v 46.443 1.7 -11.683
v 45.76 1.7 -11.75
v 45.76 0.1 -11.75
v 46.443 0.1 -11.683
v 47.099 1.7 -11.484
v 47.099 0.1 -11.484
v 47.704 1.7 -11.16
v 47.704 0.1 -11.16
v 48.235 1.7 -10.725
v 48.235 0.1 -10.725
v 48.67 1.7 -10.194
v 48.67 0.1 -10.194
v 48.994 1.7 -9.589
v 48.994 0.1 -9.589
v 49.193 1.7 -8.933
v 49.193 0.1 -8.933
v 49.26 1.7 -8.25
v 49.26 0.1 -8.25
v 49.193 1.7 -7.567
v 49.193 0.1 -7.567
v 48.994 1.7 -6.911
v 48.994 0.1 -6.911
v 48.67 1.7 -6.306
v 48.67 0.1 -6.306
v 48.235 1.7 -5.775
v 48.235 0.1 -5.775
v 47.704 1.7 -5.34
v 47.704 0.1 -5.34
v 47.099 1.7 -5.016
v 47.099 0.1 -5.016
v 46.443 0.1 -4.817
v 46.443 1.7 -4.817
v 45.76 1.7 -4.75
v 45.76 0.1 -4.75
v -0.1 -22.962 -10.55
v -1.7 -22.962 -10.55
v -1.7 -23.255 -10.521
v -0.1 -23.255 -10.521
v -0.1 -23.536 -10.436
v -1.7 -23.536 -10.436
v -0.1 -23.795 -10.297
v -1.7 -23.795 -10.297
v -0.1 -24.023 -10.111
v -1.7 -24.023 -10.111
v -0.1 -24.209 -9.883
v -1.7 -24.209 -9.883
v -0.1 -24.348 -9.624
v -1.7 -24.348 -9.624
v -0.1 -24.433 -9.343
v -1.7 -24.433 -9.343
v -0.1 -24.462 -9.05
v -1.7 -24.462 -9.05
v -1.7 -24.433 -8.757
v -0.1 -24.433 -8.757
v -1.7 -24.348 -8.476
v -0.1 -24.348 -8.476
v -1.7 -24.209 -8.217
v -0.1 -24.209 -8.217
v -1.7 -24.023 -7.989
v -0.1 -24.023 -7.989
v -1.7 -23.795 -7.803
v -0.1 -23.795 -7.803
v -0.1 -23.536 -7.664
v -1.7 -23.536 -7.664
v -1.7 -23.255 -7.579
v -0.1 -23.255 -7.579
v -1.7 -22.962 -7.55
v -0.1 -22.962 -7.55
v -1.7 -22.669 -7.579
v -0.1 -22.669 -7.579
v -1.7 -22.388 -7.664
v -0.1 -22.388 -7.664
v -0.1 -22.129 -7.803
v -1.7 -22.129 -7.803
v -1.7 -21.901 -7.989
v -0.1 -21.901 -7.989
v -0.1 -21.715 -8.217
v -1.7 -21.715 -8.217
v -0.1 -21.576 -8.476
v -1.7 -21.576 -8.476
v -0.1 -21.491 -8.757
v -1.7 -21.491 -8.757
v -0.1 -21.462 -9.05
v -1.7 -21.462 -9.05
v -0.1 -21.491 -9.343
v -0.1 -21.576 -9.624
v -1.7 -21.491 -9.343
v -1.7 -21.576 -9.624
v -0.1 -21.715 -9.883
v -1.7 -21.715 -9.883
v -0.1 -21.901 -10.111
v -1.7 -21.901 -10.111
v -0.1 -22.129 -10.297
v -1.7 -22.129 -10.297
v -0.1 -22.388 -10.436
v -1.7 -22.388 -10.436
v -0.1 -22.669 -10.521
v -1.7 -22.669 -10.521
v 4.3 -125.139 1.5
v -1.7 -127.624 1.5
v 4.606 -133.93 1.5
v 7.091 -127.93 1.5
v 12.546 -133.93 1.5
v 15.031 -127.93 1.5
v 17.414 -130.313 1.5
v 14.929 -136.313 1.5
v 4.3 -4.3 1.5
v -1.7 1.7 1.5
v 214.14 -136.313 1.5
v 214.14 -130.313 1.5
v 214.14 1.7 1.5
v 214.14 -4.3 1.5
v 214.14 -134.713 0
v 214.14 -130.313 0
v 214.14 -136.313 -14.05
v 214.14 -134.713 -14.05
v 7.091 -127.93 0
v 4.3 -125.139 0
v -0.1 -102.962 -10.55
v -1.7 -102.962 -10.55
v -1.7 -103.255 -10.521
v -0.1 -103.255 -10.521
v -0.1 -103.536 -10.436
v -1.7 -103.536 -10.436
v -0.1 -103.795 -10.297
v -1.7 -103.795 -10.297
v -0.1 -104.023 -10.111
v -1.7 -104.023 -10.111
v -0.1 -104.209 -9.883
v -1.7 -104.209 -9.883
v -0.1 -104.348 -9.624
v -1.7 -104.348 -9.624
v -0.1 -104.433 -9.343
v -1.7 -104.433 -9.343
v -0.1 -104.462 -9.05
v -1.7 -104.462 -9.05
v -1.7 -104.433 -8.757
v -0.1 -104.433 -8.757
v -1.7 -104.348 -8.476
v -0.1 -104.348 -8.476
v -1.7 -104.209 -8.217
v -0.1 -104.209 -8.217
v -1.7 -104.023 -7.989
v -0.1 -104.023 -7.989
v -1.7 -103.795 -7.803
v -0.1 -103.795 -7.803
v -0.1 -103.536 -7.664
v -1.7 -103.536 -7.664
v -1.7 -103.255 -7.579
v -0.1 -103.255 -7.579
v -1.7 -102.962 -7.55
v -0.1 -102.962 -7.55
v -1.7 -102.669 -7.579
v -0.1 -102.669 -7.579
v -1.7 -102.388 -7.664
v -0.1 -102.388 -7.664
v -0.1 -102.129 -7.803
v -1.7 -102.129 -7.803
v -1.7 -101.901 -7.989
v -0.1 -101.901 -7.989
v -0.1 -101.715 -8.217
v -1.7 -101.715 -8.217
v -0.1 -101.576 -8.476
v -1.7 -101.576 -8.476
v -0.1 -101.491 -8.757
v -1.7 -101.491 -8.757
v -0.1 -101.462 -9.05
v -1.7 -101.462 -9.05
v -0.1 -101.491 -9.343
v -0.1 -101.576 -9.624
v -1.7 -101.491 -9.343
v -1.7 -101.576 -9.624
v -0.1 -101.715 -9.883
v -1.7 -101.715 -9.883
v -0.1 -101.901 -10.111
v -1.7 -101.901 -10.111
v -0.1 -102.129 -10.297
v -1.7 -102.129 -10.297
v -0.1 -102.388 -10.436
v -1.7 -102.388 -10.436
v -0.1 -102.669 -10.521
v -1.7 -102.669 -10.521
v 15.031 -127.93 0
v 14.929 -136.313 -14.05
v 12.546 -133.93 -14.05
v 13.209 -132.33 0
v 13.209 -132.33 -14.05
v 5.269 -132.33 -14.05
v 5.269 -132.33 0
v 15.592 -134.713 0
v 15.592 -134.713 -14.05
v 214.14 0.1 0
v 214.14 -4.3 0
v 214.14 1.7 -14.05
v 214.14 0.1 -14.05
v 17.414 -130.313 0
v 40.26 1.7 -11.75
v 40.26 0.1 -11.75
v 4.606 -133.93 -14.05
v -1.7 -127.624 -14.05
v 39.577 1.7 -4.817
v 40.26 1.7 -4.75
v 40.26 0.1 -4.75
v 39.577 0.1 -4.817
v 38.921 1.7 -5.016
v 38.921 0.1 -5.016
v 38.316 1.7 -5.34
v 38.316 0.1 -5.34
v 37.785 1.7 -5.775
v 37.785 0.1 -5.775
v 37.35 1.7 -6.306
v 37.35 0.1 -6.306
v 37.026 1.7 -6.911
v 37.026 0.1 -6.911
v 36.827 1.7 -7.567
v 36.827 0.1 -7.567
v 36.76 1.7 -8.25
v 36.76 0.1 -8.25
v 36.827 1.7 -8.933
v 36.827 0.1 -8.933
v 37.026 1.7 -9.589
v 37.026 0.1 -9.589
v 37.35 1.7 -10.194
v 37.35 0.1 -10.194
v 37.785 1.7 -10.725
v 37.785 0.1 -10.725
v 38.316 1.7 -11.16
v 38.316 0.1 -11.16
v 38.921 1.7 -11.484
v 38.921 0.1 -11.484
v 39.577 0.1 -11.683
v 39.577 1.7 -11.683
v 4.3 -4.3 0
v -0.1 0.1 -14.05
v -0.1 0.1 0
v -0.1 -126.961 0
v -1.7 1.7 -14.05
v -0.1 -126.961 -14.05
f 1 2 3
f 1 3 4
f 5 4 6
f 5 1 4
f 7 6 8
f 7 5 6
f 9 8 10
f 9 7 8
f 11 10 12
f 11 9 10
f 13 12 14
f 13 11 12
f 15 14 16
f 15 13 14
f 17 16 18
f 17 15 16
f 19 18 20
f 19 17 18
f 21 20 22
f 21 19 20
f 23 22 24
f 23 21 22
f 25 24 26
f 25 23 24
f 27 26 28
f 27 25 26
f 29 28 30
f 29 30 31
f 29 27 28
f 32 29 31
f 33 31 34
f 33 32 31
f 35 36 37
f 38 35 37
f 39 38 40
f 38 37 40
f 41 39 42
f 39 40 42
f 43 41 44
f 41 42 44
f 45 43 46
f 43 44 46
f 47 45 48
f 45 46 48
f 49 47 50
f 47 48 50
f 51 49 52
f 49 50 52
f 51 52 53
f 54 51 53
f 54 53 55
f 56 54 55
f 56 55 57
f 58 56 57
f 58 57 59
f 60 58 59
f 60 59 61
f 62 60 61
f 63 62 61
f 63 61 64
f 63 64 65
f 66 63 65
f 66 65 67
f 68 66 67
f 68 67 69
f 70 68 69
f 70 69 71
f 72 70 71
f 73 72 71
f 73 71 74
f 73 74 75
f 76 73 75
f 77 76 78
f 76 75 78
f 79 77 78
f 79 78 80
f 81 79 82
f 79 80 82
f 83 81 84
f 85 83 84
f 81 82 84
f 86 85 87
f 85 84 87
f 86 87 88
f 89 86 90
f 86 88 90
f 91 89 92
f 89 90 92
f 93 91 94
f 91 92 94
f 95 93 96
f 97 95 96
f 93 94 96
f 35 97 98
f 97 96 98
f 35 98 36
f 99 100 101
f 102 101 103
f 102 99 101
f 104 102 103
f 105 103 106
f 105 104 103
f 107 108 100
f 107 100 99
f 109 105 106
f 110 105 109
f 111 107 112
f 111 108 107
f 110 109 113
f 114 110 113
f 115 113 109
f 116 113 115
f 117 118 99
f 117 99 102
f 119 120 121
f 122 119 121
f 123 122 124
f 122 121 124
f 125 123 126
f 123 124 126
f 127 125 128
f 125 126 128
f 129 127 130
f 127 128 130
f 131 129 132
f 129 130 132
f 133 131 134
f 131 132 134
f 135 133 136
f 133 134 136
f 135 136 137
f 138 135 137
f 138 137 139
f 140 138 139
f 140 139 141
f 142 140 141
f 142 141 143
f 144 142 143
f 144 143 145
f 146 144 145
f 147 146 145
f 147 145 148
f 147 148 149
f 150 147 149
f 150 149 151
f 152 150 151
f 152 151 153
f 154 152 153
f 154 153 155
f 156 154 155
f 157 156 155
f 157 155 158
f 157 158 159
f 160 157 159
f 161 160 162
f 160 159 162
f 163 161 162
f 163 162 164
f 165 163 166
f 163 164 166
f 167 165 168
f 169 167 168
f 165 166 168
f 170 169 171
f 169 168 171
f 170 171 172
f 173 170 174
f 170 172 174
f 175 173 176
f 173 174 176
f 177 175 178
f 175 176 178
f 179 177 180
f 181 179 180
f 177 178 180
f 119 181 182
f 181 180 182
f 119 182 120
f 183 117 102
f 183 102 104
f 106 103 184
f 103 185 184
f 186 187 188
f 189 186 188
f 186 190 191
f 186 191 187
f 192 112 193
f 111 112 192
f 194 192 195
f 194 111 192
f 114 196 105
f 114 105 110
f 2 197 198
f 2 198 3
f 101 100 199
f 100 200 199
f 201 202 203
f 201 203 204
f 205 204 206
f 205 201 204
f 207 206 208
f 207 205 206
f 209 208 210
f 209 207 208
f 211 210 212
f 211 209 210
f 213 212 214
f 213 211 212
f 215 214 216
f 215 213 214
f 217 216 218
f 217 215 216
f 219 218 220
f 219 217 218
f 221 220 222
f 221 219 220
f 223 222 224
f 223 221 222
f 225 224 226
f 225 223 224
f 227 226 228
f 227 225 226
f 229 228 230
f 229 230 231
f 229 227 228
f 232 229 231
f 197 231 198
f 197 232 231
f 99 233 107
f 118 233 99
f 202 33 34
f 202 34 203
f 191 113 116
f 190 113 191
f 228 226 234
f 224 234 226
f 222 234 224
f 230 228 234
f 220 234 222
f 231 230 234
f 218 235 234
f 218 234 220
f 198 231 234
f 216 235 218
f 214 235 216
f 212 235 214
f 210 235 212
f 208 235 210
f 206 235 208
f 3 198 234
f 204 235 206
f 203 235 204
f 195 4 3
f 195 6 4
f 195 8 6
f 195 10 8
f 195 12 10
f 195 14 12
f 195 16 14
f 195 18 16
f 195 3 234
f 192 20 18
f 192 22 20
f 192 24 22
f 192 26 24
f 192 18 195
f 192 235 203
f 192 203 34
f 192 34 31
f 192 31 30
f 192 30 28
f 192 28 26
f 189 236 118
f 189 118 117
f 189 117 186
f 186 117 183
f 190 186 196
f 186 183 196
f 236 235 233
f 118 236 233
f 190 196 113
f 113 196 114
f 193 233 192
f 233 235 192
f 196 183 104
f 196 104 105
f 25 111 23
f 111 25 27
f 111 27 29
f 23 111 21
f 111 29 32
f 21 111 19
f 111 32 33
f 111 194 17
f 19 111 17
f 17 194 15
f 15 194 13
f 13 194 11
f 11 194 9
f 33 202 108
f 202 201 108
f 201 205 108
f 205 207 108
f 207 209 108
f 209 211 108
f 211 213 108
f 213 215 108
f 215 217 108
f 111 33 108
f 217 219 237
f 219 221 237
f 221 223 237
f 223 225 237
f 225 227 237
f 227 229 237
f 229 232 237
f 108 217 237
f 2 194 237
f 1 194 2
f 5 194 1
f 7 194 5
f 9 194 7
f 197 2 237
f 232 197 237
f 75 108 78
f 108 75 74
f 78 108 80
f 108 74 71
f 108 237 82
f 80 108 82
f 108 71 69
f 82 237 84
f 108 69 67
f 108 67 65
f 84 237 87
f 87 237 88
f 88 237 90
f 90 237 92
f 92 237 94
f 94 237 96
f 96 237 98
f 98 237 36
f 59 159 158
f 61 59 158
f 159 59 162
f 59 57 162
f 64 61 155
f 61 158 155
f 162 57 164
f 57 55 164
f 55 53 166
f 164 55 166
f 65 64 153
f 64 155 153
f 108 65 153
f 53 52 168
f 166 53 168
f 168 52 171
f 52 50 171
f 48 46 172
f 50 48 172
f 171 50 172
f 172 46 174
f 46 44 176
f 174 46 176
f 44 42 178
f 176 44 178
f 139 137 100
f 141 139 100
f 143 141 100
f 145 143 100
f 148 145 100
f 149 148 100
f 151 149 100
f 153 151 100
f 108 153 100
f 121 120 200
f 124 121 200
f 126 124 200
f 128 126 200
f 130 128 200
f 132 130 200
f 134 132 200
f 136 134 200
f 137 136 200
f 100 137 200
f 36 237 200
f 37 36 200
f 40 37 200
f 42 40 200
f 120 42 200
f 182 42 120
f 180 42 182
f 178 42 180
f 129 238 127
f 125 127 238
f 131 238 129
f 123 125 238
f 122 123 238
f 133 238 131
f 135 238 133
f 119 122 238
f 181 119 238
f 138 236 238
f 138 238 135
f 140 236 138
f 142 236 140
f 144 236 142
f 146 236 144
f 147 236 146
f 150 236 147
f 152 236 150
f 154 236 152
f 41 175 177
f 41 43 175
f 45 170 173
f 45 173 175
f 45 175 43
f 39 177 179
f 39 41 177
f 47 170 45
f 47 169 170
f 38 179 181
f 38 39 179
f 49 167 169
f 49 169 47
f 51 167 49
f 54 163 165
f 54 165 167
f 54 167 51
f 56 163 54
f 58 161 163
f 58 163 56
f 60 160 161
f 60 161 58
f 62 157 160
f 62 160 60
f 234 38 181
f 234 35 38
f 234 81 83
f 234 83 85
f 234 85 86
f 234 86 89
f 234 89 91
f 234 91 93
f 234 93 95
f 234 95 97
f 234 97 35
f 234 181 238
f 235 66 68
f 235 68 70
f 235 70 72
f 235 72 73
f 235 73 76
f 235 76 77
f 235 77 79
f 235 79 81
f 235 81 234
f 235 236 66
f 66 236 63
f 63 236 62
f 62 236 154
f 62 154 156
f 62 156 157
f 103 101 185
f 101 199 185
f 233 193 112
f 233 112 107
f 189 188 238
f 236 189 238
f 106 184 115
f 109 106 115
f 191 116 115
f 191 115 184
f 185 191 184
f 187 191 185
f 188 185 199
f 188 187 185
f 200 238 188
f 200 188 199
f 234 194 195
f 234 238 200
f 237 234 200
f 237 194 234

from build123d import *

# Parameters (mm, degrees)
P_IDAT_VYSUNUT_M1_DEPTH  = 14.05
P_IDAT_VYSUNUT_M2_DEPTH  = 1.5
ODEBRAT_VYSUNUT_M1_DEPTH = 1.6
ODEBRAT_VYSUNUT_M2_REACH = 454.909
SKICA4_R                 = 1.5
SKICA5_W                 = 215.84
SKICA5_H                 = 15.55
ODEBRAT_VYSUNUT_M3_DEPTH = 452.805134863


with BuildPart() as part:
    # Skica1 → Přidat vysunutím1 (new body)
    with BuildSketch(Plane.XY):
        Polygon((-1.7, 1.7), (429.98, 1.7), (429.98, -127.624163056), (423.673791129, -133.930371927), (415.733791129, -133.930371927), (413.350841277, -136.313321779), (14.929158723, -136.313321779), (12.546208871, -133.930371927), (4.606208871, -133.930371927), (-1.7, -127.624163056), align=None)
        Polygon((-0.1, 0.1), (428.38, 0.1), (428.38, -126.961421356), (423.01104943, -132.330371927), (415.07104943, -132.330371927), (412.688099577, -134.713321779), (15.591900423, -134.713321779), (13.20895057, -132.330371927), (5.26895057, -132.330371927), (-0.1, -126.961421356), align=None, mode=Mode.SUBTRACT)
    extrude(amount=-P_IDAT_VYSUNUT_M1_DEPTH)

    # Skica2 → Přidat vysunutím2 (add)
    with BuildSketch(Plane.XY):
        Polygon((-1.7, 1.7), (-1.7, -127.624163056), (4.606208871, -133.930371927), (12.546208871, -133.930371927), (14.929158723, -136.313321779), (413.350841277, -136.313321779), (415.733791129, -133.930371927), (423.673791129, -133.930371927), (429.98, -127.624163056), (429.98, 1.7), align=None)
        Polygon((4.3, -4.3), (4.3, -125.138881682), (7.091490245, -127.930371927), (15.031490245, -127.930371927), (17.414440098, -130.313321779), (410.865559902, -130.313321779), (413.248509755, -127.930371927), (421.188509755, -127.930371927), (423.98, -125.138881682), (423.98, -4.3), align=None, mode=Mode.SUBTRACT)
    extrude(amount=P_IDAT_VYSUNUT_M2_DEPTH)

    # Skica3 → Odebrat vysunutím1 (cut)
    with BuildSketch(Plane(origin=(0, 1.7, 0), x_dir=(1, 0, 0), z_dir=(0, 1, 0))):
        with BuildLine():
            Line((45.76, 4.75), (40.26, 4.75))
            ThreePointArc((40.26, 4.75), (36.76, 8.25), (40.26, 11.75))
            Line((40.26, 11.75), (45.76, 11.75))
            ThreePointArc((45.76, 11.75), (49.26, 8.25), (45.76, 4.75))
        make_face()
    extrude(amount=-ODEBRAT_VYSUNUT_M1_DEPTH, mode=Mode.SUBTRACT)

    # Odebrat vysunutím2: up to this face of the body (flat: up to its plane)
    odebrat_vysunut_m2_end = Plane(part.part.faces().sort_by_distance((429.98, -62.962081528, -6.275))[0])
    # Skica4 → Odebrat vysunutím2 (cut, up to the picked face)
    with BuildSketch(Plane.ZY.offset(1.7), mode=Mode.PRIVATE) as odebrat_vysunut_m2_sk1:
        with Locations(Location((-9.05, -22.962081528, 0), (0, 0, 180))):
            Circle(SKICA4_R)
    odebrat_vysunut_m2_tool1 = split(extrude(odebrat_vysunut_m2_sk1.sketch, amount=-ODEBRAT_VYSUNUT_M2_REACH, mode=Mode.PRIVATE), bisect_by=odebrat_vysunut_m2_end, keep=Keep.BOTH, mode=Mode.PRIVATE)
    # Skica4 → Odebrat vysunutím2 (cut, up to the picked face)
    with BuildSketch(Plane.ZY.offset(1.7), mode=Mode.PRIVATE) as odebrat_vysunut_m2_sk2:
        with Locations(Location((-9.05, -102.962081528, 0), (0, 0, 180))):
            Circle(SKICA4_R)
    odebrat_vysunut_m2_tool2 = split(extrude(odebrat_vysunut_m2_sk2.sketch, amount=-ODEBRAT_VYSUNUT_M2_REACH, mode=Mode.PRIVATE), bisect_by=odebrat_vysunut_m2_end, keep=Keep.BOTH, mode=Mode.PRIVATE)
    add(odebrat_vysunut_m2_tool1.solids().sort_by(Axis((-1.7, -22.962082, -9.05), (1, 0, 0)))[0], mode=Mode.SUBTRACT)
    add(odebrat_vysunut_m2_tool2.solids().sort_by(Axis((-1.7, -102.962082, -9.05), (1, 0, 0)))[0], mode=Mode.SUBTRACT)

    # Skica5 → Odebrat vysunutím3 (cut, through all)
    with BuildSketch(Plane(origin=(0, 1.7, 0), x_dir=(1, 0, 0), z_dir=(0, 1, 0))):
        with Locations((322.06, 6.275)):
            Rectangle(SKICA5_W, SKICA5_H)
    extrude(amount=-ODEBRAT_VYSUNUT_M3_DEPTH, mode=Mode.SUBTRACT)


solid = part.part
